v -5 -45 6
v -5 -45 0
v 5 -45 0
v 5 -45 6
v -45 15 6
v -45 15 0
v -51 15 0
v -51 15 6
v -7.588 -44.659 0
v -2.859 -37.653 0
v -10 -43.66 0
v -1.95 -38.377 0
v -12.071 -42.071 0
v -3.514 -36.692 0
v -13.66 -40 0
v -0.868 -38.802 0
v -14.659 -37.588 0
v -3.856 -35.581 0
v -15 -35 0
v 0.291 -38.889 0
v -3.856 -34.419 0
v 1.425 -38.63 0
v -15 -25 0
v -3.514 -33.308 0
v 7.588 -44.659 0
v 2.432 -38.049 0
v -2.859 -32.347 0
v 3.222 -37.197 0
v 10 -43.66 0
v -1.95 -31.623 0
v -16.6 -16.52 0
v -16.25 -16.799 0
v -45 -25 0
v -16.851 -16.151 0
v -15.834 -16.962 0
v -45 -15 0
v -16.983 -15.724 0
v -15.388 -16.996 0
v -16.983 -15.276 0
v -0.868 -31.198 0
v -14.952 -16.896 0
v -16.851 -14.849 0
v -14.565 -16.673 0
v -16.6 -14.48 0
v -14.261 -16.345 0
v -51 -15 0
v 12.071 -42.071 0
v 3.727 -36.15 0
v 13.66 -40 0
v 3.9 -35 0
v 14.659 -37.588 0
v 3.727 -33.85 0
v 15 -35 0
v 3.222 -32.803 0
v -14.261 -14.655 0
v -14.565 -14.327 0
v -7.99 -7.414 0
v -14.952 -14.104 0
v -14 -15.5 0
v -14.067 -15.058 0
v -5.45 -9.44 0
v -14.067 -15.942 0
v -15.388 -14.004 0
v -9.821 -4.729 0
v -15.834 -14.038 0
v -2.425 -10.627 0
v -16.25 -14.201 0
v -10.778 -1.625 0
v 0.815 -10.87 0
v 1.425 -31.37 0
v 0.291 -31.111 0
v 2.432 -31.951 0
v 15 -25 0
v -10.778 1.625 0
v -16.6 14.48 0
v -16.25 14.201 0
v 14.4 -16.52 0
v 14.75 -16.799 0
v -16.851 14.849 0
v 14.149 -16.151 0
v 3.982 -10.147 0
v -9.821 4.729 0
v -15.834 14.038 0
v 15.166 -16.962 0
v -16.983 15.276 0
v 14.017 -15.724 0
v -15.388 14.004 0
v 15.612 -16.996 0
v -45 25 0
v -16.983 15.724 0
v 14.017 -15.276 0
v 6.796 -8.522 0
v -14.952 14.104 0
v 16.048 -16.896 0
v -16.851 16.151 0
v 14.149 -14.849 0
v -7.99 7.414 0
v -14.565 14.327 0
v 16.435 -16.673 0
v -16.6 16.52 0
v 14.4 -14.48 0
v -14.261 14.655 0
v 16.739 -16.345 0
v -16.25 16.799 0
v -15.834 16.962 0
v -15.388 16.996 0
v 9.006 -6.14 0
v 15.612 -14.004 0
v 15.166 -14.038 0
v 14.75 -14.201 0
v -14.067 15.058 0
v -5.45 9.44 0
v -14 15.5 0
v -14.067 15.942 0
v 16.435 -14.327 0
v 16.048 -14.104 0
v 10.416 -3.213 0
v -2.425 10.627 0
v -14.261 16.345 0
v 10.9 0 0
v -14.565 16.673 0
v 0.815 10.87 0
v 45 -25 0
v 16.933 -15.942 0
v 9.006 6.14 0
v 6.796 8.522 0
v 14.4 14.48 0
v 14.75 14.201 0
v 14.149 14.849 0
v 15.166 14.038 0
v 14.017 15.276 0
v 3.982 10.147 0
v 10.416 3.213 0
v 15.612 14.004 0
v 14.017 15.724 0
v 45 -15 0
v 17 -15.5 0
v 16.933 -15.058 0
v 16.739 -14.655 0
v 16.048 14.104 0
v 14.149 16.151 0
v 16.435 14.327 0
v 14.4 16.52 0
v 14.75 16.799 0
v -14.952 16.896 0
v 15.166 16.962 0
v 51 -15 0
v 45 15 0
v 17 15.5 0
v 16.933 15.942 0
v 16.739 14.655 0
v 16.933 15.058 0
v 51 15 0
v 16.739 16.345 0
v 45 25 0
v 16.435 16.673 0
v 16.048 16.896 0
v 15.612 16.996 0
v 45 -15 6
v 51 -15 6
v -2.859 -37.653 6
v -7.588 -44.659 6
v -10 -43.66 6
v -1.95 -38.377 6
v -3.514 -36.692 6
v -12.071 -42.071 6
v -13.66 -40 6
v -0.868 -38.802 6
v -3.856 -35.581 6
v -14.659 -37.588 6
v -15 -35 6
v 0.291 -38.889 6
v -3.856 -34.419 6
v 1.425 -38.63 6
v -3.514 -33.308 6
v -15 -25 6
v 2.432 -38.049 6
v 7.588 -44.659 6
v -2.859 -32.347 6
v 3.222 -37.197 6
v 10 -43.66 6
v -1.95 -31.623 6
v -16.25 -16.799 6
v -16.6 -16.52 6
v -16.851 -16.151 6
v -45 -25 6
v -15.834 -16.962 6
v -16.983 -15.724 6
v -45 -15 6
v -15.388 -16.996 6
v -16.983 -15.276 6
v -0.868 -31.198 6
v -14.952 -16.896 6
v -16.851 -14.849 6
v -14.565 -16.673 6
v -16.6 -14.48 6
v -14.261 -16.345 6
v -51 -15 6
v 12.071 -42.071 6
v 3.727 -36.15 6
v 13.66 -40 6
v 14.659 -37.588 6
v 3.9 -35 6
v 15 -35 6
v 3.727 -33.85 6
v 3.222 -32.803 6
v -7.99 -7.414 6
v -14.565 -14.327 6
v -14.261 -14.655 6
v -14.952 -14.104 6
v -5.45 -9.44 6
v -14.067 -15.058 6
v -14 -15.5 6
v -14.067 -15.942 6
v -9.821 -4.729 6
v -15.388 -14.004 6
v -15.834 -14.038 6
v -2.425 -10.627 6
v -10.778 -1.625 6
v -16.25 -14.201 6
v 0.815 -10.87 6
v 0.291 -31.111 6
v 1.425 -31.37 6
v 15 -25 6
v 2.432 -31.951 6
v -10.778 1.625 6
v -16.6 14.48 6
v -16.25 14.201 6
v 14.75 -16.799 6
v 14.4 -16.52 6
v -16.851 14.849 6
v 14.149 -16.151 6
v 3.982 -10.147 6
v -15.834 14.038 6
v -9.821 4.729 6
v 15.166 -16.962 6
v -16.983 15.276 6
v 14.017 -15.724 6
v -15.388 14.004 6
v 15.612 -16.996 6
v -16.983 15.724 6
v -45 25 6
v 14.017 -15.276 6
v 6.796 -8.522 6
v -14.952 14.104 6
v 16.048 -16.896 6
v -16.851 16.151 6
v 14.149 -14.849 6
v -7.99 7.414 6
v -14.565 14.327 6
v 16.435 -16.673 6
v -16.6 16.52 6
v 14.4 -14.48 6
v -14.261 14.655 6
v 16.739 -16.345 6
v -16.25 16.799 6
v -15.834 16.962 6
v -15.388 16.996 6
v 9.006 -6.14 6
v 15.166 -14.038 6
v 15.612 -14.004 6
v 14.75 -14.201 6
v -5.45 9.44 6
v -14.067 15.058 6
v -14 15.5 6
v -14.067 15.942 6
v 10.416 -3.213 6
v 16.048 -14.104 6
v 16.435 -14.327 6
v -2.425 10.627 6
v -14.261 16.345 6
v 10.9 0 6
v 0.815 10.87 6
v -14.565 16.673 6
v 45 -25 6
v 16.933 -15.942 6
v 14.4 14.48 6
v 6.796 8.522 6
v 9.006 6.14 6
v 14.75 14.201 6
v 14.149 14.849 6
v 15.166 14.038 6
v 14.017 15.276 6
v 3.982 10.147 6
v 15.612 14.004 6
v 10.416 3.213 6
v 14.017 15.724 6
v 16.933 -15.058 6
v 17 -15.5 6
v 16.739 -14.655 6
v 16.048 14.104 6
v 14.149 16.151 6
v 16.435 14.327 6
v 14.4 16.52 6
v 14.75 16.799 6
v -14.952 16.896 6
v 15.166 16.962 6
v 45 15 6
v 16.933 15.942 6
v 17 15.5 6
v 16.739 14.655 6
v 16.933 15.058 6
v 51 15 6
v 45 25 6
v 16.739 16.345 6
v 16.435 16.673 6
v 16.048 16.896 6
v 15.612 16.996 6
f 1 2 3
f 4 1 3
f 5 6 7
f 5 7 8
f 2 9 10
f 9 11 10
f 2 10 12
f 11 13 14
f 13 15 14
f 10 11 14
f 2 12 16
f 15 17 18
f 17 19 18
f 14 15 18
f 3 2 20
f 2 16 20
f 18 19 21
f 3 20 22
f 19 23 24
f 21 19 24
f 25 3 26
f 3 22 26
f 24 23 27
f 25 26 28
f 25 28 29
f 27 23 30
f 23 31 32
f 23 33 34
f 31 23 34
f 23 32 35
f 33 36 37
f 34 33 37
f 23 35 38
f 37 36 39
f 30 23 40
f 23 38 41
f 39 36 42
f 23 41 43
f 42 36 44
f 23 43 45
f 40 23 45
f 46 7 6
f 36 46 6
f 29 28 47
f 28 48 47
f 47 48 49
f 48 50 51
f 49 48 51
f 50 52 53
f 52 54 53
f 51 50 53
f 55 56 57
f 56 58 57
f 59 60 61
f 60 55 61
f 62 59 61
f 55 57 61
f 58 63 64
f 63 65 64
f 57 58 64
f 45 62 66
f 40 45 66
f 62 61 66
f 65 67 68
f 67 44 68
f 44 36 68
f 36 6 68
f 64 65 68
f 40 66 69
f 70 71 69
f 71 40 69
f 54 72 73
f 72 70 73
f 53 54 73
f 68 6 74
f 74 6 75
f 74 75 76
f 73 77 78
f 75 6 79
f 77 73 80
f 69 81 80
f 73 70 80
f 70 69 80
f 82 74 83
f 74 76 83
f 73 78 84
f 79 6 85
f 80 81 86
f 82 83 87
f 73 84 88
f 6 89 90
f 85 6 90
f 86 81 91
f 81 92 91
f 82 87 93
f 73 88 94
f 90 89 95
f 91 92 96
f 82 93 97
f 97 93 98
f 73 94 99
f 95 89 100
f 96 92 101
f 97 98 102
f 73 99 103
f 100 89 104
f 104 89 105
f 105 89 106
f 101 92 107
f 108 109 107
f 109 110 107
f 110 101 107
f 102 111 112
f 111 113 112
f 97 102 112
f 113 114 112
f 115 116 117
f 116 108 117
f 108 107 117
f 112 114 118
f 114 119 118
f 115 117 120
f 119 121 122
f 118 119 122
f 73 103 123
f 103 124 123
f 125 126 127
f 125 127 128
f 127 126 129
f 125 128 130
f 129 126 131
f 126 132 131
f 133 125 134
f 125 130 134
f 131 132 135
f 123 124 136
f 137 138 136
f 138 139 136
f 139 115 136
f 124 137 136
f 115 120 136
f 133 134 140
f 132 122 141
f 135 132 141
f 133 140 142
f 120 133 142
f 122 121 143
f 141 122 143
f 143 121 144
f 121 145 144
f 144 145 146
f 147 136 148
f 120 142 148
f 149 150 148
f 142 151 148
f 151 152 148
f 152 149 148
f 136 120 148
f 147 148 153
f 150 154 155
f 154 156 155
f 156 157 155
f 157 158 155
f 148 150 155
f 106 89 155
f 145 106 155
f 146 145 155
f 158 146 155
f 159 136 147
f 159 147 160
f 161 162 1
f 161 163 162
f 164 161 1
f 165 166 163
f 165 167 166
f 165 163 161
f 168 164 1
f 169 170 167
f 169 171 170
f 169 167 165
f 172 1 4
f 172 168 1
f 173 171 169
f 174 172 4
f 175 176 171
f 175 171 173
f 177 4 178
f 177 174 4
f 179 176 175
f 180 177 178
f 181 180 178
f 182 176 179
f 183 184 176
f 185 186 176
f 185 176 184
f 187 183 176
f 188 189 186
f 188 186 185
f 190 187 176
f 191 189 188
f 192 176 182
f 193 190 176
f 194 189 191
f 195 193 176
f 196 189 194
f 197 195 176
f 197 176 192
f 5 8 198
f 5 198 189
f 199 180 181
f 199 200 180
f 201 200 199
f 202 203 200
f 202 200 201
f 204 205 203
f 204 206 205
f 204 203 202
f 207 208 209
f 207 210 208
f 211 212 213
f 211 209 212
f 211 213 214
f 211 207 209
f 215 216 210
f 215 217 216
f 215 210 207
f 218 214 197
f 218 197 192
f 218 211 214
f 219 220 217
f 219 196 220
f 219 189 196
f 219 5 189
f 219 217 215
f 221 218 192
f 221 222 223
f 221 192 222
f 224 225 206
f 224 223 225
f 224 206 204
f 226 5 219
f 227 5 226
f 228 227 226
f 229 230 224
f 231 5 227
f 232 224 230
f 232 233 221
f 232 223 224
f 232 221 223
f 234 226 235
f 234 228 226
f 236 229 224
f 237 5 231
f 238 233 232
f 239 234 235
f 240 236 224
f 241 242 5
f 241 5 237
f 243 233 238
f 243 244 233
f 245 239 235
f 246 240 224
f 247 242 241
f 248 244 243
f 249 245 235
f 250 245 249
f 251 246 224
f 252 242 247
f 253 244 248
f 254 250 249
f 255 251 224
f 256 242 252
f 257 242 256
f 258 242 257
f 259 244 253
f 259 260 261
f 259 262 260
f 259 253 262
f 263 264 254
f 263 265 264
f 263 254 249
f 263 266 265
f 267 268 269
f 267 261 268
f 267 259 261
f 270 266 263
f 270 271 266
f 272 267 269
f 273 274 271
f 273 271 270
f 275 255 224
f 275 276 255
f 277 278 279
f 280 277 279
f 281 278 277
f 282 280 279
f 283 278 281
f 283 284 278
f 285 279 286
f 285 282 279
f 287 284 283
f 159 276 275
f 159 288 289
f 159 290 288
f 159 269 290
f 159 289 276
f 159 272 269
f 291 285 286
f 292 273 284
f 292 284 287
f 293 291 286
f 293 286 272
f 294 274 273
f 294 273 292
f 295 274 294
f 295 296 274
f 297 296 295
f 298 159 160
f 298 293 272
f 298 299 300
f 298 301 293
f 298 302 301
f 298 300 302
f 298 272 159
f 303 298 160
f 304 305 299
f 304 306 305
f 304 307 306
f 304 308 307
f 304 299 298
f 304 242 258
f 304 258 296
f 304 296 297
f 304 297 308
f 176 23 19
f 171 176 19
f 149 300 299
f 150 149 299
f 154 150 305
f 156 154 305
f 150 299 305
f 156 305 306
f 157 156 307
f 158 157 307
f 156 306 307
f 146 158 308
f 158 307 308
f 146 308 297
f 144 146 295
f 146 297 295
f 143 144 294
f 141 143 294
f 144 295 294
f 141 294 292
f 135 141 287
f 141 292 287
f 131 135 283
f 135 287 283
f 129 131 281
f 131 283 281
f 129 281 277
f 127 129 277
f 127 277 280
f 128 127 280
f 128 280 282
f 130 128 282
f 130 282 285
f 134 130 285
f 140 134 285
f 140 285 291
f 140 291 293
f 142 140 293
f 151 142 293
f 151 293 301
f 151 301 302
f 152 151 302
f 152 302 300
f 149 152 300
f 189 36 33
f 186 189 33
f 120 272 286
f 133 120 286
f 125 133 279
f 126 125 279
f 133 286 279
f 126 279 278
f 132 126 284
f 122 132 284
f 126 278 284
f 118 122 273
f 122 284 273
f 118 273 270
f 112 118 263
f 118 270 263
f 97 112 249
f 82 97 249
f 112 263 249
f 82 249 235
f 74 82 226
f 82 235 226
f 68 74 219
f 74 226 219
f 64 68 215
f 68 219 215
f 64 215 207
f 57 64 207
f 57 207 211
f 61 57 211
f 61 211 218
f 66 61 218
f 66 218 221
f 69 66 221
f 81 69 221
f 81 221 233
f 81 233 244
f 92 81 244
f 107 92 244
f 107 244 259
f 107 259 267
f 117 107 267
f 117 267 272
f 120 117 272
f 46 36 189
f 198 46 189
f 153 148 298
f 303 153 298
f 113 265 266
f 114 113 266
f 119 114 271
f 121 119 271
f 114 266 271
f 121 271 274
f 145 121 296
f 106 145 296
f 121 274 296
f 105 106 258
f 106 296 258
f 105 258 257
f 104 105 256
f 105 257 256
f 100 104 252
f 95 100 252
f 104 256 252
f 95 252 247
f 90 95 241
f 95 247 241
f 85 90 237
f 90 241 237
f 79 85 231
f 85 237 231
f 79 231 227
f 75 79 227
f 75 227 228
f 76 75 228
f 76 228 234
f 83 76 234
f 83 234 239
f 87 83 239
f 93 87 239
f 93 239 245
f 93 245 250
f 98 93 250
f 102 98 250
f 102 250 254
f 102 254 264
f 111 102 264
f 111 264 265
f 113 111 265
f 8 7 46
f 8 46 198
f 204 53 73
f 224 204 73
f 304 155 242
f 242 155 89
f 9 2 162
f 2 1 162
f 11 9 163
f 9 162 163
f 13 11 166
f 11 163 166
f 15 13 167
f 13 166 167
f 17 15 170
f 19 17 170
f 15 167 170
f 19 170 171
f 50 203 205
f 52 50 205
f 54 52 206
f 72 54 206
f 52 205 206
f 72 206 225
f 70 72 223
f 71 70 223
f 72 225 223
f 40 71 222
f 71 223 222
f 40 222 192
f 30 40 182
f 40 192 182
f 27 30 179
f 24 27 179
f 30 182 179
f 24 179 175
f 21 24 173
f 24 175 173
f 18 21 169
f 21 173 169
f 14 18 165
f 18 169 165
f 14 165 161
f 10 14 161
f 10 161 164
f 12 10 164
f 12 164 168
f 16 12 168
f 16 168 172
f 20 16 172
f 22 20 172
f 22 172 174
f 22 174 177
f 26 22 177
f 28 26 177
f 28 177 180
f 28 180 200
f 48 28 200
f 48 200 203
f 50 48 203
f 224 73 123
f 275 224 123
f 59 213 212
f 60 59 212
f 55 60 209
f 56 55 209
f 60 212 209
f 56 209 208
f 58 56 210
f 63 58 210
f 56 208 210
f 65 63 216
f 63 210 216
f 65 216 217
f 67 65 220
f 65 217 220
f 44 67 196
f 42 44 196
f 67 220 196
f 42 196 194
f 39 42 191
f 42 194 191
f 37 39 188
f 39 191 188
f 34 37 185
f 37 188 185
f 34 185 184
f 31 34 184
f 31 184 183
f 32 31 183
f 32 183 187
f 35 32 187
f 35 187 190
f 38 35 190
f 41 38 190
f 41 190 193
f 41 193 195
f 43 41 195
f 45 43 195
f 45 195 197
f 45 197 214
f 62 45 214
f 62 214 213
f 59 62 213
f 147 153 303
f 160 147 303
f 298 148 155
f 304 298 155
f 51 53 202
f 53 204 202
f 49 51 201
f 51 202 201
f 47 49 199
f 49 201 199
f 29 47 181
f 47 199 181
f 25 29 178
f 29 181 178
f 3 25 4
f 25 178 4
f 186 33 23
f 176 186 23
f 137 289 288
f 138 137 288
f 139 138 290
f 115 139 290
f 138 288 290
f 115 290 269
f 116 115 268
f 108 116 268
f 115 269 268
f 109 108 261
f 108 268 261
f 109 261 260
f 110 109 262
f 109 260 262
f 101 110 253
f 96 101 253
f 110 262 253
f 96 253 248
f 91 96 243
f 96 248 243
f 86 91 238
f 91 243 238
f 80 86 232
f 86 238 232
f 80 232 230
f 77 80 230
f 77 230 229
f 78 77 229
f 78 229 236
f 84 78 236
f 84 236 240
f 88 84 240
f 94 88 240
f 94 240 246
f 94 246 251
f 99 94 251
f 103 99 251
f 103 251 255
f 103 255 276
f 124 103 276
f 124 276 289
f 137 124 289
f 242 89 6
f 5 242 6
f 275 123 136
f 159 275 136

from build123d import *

# Parameters (mm, degrees)
SALIENTE_EXTRUIR1_DEPTH      = 6
CROQUIS2_W                   = 6
CROQUIS2_H                   = 30
SALIENTE_EXTRUIR2_DEPTH      = 6
SALIENTE_EXTRUIR2_DEPTH_BACK = 96
CORTAR_EXTRUIR1_REACH        = 8
CROQUIS3_R                   = 1.5
CROQUIS3_R_2                 = 10.9
CROQUIS3_R_3                 = 3.9
REDONDEO2_R                  = 10


with BuildPart() as part:
    # Croquis1 → Saliente-Extruir1 (new body)
    with BuildSketch(Plane.XY):
        Polygon((15, -25), (45, -25), (45, 25), (-45, 25), (-45, -25), (-15, -25), (-15, -45), (15, -45), align=None)
    extrude(amount=SALIENTE_EXTRUIR1_DEPTH)

    # Croquis2 → Saliente-Extruir2 (add, two sides)
    with BuildSketch(Plane.ZY.offset(45)) as saliente_extruir2_sk:
        with Locations((3, 0)):
            Rectangle(CROQUIS2_W, CROQUIS2_H)
    extrude(amount=SALIENTE_EXTRUIR2_DEPTH)
    extrude(saliente_extruir2_sk.sketch, amount=-SALIENTE_EXTRUIR2_DEPTH_BACK)

    # Croquis3 → Cortar-Extruir1 (cut, up to next)
    with BuildSketch(Plane.XY.offset(6), mode=Mode.PRIVATE) as cortar_extruir1_sk1:
        with Locations((-15.5, 15.5)):
            Circle(CROQUIS3_R)
    cortar_extruir1_tool1 = extrude(cortar_extruir1_sk1.sketch, amount=-CORTAR_EXTRUIR1_REACH, mode=Mode.PRIVATE) & part.part
    add(cortar_extruir1_tool1.solids().sort_by_distance((-15.5, 15.5, 6))[0], mode=Mode.SUBTRACT)
    # Croquis3 → Cortar-Extruir1 (cut, up to next)
    with BuildSketch(Plane.XY.offset(6), mode=Mode.PRIVATE) as cortar_extruir1_sk2:
        with Locations((15.5, 15.5)):
            Circle(CROQUIS3_R)
    cortar_extruir1_tool2 = extrude(cortar_extruir1_sk2.sketch, amount=-CORTAR_EXTRUIR1_REACH, mode=Mode.PRIVATE) & part.part
    add(cortar_extruir1_tool2.solids().sort_by_distance((15.5, 15.5, 6))[0], mode=Mode.SUBTRACT)
    # Croquis3 → Cortar-Extruir1 (cut, up to next)
    with BuildSketch(Plane.XY.offset(6), mode=Mode.PRIVATE) as cortar_extruir1_sk3:
        with Locations((15.5, -15.5)):
            Circle(CROQUIS3_R)
    cortar_extruir1_tool3 = extrude(cortar_extruir1_sk3.sketch, amount=-CORTAR_EXTRUIR1_REACH, mode=Mode.PRIVATE) & part.part
    add(cortar_extruir1_tool3.solids().sort_by_distance((15.5, -15.5, 6))[0], mode=Mode.SUBTRACT)
    # Croquis3 → Cortar-Extruir1 (cut, up to next)
    with BuildSketch(Plane.XY.offset(6), mode=Mode.PRIVATE) as cortar_extruir1_sk4:
        with Locations((-15.5, -15.5)):
            Circle(CROQUIS3_R)
    cortar_extruir1_tool4 = extrude(cortar_extruir1_sk4.sketch, amount=-CORTAR_EXTRUIR1_REACH, mode=Mode.PRIVATE) & part.part
    add(cortar_extruir1_tool4.solids().sort_by_distance((-15.5, -15.5, 6))[0], mode=Mode.SUBTRACT)
    # Croquis3 → Cortar-Extruir1 (cut, up to next)
    with BuildSketch(Plane.XY.offset(6), mode=Mode.PRIVATE) as cortar_extruir1_sk5:
        Circle(CROQUIS3_R_2)
    cortar_extruir1_tool5 = extrude(cortar_extruir1_sk5.sketch, amount=-CORTAR_EXTRUIR1_REACH, mode=Mode.PRIVATE) & part.part
    add(cortar_extruir1_tool5.solids().sort_by_distance((0, 0, 6))[0], mode=Mode.SUBTRACT)
    # Croquis3 → Cortar-Extruir1 (cut, up to next)
    with BuildSketch(Plane.XY.offset(6), mode=Mode.PRIVATE) as cortar_extruir1_sk6:
        with Locations((0, -35)):
            Circle(CROQUIS3_R_3)
    cortar_extruir1_tool6 = extrude(cortar_extruir1_sk6.sketch, amount=-CORTAR_EXTRUIR1_REACH, mode=Mode.PRIVATE) & part.part
    add(cortar_extruir1_tool6.solids().sort_by_distance((0, -35, 6))[0], mode=Mode.SUBTRACT)

    # Redondeo2
    redondeo2_edges = [part.edges().sort_by_distance(p)[0] for p in [
        (15, -45, 3),
        (-15, -45, 3),
    ]]
    fillet(redondeo2_edges, radius=REDONDEO2_R)


solid = part.part
